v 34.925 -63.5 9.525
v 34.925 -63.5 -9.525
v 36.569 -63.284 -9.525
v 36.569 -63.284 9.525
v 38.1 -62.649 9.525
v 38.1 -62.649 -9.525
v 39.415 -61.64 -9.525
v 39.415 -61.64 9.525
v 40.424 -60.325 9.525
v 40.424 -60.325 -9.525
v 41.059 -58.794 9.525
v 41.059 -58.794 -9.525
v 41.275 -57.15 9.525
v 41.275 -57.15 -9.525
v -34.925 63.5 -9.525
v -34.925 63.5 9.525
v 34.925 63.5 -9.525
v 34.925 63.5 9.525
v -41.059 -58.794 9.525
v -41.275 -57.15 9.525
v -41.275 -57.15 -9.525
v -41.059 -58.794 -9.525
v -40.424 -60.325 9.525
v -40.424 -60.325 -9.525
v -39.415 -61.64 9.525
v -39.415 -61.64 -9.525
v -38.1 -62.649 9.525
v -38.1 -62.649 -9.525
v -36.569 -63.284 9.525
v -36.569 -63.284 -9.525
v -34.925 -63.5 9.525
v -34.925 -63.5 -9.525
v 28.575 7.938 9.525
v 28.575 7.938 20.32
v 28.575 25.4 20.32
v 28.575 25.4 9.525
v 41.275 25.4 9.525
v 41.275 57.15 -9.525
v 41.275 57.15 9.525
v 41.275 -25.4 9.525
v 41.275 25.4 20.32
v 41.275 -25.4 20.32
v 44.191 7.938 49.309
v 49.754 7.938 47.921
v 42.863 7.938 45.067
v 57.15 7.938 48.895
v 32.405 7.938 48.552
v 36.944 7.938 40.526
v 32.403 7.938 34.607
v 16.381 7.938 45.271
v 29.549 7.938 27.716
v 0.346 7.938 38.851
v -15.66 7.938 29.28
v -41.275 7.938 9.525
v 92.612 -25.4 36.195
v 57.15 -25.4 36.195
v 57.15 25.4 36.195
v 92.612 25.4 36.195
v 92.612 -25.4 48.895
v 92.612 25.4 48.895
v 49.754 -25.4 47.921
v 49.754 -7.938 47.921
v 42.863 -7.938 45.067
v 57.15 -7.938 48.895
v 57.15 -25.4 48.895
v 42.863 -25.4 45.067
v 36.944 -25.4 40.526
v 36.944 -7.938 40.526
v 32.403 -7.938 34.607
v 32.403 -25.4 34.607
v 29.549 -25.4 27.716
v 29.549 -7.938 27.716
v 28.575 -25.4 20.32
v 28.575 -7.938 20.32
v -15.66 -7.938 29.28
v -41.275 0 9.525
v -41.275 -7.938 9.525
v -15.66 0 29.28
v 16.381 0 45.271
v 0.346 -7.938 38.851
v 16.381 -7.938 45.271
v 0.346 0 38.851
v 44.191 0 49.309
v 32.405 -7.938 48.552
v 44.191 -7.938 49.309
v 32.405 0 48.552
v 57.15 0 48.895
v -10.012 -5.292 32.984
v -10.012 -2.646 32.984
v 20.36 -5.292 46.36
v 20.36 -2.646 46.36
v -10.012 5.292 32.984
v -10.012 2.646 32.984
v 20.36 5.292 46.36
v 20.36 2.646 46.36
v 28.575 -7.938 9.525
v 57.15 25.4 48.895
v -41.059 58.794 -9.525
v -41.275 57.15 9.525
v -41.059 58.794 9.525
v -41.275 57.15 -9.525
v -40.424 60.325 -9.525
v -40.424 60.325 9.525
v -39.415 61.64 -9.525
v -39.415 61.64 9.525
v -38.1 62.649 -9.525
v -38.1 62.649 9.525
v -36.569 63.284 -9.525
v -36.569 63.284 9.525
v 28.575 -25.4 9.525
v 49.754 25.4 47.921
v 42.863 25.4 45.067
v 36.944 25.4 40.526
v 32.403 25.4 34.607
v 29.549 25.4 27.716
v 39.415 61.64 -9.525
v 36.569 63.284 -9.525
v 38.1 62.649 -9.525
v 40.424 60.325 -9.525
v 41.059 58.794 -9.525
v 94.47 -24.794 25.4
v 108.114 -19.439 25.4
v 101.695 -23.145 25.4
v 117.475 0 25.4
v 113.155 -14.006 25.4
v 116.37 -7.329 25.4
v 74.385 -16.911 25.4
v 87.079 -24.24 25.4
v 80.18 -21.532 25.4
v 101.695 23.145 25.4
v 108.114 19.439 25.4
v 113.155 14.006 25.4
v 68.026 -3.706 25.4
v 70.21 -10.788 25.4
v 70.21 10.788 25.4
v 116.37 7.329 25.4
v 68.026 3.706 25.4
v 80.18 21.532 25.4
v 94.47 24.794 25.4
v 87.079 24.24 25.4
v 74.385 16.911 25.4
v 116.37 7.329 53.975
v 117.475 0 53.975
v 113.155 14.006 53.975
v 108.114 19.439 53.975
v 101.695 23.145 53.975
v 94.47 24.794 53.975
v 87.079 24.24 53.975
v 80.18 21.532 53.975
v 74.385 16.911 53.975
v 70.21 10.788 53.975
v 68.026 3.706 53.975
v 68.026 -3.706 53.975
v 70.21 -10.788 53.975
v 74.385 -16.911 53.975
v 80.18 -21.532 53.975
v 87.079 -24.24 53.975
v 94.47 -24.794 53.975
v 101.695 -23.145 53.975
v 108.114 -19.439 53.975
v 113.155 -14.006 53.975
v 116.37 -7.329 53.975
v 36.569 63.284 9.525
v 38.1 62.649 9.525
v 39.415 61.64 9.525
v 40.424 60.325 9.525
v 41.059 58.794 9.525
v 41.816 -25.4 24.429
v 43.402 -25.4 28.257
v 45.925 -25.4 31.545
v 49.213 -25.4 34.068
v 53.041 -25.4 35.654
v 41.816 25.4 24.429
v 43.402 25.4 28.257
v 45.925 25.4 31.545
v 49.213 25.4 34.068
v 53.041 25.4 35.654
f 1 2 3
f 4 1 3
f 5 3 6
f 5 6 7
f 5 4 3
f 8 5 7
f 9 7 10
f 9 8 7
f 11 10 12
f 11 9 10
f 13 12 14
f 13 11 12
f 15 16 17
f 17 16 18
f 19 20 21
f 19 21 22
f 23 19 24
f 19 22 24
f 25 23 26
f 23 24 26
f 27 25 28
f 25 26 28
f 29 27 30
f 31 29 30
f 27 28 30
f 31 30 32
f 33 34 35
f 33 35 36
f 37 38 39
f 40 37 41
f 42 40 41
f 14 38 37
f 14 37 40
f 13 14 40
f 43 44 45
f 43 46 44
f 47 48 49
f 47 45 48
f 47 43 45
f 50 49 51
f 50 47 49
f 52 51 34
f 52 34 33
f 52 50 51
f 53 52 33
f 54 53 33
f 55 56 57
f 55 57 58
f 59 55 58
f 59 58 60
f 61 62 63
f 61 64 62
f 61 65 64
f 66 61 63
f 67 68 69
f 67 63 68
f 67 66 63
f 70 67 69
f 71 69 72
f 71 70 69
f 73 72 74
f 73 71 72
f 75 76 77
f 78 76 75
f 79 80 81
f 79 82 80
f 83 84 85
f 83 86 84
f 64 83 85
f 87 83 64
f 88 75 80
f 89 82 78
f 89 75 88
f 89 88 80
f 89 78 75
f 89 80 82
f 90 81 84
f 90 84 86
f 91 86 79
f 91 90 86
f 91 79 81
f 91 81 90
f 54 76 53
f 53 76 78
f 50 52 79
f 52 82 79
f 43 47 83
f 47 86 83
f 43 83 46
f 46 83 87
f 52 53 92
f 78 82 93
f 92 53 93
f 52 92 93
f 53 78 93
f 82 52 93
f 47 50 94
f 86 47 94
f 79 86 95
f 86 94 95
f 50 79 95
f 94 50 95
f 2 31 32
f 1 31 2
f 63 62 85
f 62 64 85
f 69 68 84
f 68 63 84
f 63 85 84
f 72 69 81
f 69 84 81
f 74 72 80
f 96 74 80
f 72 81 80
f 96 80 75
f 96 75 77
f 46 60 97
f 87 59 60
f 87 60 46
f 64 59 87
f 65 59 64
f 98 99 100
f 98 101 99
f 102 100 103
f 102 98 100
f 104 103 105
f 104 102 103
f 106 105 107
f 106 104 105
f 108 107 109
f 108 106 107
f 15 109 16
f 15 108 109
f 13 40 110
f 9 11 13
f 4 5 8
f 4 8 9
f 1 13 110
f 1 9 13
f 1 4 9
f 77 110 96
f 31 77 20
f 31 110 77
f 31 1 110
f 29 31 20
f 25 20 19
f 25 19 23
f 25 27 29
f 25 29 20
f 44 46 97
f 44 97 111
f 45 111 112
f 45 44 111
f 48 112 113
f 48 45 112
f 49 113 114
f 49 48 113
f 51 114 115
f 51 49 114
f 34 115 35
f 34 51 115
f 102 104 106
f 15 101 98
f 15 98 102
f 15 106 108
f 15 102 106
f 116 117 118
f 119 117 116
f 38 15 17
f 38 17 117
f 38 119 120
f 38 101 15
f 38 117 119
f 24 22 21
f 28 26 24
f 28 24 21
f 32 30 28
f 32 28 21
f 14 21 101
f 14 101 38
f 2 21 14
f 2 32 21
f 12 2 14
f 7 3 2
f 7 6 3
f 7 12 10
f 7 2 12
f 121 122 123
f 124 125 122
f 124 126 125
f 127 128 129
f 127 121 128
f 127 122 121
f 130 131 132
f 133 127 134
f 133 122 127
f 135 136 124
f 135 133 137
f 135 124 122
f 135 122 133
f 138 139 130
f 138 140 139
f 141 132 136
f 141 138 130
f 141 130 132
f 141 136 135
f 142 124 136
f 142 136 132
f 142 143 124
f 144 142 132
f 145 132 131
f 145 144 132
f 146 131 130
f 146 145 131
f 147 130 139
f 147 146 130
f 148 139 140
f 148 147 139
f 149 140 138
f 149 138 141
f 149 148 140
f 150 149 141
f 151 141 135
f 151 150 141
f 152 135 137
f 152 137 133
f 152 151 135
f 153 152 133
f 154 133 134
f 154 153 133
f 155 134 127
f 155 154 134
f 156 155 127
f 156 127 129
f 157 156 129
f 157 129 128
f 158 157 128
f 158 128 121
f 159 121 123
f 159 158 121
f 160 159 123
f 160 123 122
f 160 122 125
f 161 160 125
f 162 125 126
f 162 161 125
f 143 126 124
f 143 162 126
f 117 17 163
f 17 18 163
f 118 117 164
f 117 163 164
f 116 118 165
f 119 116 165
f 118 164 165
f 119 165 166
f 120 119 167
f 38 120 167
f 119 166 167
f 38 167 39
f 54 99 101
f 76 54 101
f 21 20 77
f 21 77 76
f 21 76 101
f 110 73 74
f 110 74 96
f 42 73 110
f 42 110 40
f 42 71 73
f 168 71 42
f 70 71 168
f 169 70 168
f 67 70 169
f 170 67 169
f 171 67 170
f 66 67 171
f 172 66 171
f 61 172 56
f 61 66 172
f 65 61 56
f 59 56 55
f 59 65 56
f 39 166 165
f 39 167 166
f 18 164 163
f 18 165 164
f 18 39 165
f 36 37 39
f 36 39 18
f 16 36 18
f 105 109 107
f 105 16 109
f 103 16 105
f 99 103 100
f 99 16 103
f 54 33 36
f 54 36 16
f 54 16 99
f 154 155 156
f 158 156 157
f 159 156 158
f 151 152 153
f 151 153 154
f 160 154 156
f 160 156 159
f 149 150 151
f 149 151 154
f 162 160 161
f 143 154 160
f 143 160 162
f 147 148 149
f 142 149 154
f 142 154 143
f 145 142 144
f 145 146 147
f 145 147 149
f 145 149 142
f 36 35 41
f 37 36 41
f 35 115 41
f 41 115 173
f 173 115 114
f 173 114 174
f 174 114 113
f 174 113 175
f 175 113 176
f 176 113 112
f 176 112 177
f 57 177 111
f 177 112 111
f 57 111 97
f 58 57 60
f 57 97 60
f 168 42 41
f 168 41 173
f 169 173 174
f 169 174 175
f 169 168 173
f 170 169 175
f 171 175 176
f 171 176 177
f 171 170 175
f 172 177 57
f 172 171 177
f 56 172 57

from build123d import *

# Parameters (mm, degrees)
F1_DEPTH = 63.5
F0_W     = 25.9365141169
F0_H     = 12.7
F2_DEPTH = 25.4
F3_DEPTH = 7.9375
F5_R     = 6.35


with BuildPart() as f1:
    # F0 (on Front) → F1 (new body, symmetric)
    with BuildSketch(Plane.XZ):
        Polygon((28.575, 9.525), (-41.275, 9.525), (-41.275, -9.525), (41.275, -9.525), (41.275, 9.525), align=None)
    extrude(amount=F1_DEPTH, both=True)

    # F0 (on Front) → F2 (join, symmetric)
    with BuildSketch(Plane.XZ):
        with BuildLine():
            Line((28.575, 20.32), (28.575, 9.525))
            Line((28.575, 9.525), (41.275, 9.525))
            Line((41.275, 9.525), (41.275, 20.32))
            ThreePointArc((41.275, 20.32), (45.9246798487, 31.5453201513), (57.15, 36.195))
            Line((57.15, 36.195), (66.675, 36.195))
            Line((66.675, 36.195), (66.675, 48.895))
            Line((66.675, 48.895), (57.15, 48.895))
            ThreePointArc((57.15, 48.895), (36.9444237276, 40.5255762724), (28.575, 20.32))
        make_face()
        with Locations((79.6432570585, 42.545)):
            Rectangle(F0_W, F0_H)
    extrude(amount=F2_DEPTH, both=True)

    # F0 (on Front) → F3 (join, symmetric)
    with BuildSketch(Plane.XZ):
        with BuildLine():
            add(Edge.make_bspline(
                [(-41.275, 9.525), (-7.129882928, 37.7731919289), (14.7148529068, 52.0329512656), (57.15, 48.895)],
                knots=[0, 0, 0, 0, 106.0069692284, 106.0069692284, 106.0069692284, 106.0069692284], degree=3))
            Line((-41.275, 9.525), (28.575, 9.525))
            Line((28.575, 9.525), (28.575, 20.32))
            ThreePointArc((28.575, 20.32), (36.9444237276, 40.5255762724), (57.15, 48.895))
        make_face()
    extrude(amount=F3_DEPTH, both=True)

    # F5
    f5_edges = [f1.edges().sort_by_distance(p)[0] for p in [
        (41.275, -63.5, 0),
        (-41.275, -63.5, 0),
        (41.275, 63.5, 0),
        (-41.275, 63.5, 0),
    ]]
    fillet(f5_edges, radius=F5_R)


with BuildPart() as f4:
    # F0 (on Front) → F4 (revolve)
    with BuildSketch(Plane.XZ):
        Polygon((92.6115141169, 53.975), (92.6115141169, 48.895), (92.6115141169, 36.195), (92.6115141169, 25.4), (117.475, 25.4), (117.475, 53.975), align=None)
    revolve(axis=Axis((92.6115141169, 0, 39.6875), (0, 0, 1)))


solid = Compound([f1.part, f4.part])
